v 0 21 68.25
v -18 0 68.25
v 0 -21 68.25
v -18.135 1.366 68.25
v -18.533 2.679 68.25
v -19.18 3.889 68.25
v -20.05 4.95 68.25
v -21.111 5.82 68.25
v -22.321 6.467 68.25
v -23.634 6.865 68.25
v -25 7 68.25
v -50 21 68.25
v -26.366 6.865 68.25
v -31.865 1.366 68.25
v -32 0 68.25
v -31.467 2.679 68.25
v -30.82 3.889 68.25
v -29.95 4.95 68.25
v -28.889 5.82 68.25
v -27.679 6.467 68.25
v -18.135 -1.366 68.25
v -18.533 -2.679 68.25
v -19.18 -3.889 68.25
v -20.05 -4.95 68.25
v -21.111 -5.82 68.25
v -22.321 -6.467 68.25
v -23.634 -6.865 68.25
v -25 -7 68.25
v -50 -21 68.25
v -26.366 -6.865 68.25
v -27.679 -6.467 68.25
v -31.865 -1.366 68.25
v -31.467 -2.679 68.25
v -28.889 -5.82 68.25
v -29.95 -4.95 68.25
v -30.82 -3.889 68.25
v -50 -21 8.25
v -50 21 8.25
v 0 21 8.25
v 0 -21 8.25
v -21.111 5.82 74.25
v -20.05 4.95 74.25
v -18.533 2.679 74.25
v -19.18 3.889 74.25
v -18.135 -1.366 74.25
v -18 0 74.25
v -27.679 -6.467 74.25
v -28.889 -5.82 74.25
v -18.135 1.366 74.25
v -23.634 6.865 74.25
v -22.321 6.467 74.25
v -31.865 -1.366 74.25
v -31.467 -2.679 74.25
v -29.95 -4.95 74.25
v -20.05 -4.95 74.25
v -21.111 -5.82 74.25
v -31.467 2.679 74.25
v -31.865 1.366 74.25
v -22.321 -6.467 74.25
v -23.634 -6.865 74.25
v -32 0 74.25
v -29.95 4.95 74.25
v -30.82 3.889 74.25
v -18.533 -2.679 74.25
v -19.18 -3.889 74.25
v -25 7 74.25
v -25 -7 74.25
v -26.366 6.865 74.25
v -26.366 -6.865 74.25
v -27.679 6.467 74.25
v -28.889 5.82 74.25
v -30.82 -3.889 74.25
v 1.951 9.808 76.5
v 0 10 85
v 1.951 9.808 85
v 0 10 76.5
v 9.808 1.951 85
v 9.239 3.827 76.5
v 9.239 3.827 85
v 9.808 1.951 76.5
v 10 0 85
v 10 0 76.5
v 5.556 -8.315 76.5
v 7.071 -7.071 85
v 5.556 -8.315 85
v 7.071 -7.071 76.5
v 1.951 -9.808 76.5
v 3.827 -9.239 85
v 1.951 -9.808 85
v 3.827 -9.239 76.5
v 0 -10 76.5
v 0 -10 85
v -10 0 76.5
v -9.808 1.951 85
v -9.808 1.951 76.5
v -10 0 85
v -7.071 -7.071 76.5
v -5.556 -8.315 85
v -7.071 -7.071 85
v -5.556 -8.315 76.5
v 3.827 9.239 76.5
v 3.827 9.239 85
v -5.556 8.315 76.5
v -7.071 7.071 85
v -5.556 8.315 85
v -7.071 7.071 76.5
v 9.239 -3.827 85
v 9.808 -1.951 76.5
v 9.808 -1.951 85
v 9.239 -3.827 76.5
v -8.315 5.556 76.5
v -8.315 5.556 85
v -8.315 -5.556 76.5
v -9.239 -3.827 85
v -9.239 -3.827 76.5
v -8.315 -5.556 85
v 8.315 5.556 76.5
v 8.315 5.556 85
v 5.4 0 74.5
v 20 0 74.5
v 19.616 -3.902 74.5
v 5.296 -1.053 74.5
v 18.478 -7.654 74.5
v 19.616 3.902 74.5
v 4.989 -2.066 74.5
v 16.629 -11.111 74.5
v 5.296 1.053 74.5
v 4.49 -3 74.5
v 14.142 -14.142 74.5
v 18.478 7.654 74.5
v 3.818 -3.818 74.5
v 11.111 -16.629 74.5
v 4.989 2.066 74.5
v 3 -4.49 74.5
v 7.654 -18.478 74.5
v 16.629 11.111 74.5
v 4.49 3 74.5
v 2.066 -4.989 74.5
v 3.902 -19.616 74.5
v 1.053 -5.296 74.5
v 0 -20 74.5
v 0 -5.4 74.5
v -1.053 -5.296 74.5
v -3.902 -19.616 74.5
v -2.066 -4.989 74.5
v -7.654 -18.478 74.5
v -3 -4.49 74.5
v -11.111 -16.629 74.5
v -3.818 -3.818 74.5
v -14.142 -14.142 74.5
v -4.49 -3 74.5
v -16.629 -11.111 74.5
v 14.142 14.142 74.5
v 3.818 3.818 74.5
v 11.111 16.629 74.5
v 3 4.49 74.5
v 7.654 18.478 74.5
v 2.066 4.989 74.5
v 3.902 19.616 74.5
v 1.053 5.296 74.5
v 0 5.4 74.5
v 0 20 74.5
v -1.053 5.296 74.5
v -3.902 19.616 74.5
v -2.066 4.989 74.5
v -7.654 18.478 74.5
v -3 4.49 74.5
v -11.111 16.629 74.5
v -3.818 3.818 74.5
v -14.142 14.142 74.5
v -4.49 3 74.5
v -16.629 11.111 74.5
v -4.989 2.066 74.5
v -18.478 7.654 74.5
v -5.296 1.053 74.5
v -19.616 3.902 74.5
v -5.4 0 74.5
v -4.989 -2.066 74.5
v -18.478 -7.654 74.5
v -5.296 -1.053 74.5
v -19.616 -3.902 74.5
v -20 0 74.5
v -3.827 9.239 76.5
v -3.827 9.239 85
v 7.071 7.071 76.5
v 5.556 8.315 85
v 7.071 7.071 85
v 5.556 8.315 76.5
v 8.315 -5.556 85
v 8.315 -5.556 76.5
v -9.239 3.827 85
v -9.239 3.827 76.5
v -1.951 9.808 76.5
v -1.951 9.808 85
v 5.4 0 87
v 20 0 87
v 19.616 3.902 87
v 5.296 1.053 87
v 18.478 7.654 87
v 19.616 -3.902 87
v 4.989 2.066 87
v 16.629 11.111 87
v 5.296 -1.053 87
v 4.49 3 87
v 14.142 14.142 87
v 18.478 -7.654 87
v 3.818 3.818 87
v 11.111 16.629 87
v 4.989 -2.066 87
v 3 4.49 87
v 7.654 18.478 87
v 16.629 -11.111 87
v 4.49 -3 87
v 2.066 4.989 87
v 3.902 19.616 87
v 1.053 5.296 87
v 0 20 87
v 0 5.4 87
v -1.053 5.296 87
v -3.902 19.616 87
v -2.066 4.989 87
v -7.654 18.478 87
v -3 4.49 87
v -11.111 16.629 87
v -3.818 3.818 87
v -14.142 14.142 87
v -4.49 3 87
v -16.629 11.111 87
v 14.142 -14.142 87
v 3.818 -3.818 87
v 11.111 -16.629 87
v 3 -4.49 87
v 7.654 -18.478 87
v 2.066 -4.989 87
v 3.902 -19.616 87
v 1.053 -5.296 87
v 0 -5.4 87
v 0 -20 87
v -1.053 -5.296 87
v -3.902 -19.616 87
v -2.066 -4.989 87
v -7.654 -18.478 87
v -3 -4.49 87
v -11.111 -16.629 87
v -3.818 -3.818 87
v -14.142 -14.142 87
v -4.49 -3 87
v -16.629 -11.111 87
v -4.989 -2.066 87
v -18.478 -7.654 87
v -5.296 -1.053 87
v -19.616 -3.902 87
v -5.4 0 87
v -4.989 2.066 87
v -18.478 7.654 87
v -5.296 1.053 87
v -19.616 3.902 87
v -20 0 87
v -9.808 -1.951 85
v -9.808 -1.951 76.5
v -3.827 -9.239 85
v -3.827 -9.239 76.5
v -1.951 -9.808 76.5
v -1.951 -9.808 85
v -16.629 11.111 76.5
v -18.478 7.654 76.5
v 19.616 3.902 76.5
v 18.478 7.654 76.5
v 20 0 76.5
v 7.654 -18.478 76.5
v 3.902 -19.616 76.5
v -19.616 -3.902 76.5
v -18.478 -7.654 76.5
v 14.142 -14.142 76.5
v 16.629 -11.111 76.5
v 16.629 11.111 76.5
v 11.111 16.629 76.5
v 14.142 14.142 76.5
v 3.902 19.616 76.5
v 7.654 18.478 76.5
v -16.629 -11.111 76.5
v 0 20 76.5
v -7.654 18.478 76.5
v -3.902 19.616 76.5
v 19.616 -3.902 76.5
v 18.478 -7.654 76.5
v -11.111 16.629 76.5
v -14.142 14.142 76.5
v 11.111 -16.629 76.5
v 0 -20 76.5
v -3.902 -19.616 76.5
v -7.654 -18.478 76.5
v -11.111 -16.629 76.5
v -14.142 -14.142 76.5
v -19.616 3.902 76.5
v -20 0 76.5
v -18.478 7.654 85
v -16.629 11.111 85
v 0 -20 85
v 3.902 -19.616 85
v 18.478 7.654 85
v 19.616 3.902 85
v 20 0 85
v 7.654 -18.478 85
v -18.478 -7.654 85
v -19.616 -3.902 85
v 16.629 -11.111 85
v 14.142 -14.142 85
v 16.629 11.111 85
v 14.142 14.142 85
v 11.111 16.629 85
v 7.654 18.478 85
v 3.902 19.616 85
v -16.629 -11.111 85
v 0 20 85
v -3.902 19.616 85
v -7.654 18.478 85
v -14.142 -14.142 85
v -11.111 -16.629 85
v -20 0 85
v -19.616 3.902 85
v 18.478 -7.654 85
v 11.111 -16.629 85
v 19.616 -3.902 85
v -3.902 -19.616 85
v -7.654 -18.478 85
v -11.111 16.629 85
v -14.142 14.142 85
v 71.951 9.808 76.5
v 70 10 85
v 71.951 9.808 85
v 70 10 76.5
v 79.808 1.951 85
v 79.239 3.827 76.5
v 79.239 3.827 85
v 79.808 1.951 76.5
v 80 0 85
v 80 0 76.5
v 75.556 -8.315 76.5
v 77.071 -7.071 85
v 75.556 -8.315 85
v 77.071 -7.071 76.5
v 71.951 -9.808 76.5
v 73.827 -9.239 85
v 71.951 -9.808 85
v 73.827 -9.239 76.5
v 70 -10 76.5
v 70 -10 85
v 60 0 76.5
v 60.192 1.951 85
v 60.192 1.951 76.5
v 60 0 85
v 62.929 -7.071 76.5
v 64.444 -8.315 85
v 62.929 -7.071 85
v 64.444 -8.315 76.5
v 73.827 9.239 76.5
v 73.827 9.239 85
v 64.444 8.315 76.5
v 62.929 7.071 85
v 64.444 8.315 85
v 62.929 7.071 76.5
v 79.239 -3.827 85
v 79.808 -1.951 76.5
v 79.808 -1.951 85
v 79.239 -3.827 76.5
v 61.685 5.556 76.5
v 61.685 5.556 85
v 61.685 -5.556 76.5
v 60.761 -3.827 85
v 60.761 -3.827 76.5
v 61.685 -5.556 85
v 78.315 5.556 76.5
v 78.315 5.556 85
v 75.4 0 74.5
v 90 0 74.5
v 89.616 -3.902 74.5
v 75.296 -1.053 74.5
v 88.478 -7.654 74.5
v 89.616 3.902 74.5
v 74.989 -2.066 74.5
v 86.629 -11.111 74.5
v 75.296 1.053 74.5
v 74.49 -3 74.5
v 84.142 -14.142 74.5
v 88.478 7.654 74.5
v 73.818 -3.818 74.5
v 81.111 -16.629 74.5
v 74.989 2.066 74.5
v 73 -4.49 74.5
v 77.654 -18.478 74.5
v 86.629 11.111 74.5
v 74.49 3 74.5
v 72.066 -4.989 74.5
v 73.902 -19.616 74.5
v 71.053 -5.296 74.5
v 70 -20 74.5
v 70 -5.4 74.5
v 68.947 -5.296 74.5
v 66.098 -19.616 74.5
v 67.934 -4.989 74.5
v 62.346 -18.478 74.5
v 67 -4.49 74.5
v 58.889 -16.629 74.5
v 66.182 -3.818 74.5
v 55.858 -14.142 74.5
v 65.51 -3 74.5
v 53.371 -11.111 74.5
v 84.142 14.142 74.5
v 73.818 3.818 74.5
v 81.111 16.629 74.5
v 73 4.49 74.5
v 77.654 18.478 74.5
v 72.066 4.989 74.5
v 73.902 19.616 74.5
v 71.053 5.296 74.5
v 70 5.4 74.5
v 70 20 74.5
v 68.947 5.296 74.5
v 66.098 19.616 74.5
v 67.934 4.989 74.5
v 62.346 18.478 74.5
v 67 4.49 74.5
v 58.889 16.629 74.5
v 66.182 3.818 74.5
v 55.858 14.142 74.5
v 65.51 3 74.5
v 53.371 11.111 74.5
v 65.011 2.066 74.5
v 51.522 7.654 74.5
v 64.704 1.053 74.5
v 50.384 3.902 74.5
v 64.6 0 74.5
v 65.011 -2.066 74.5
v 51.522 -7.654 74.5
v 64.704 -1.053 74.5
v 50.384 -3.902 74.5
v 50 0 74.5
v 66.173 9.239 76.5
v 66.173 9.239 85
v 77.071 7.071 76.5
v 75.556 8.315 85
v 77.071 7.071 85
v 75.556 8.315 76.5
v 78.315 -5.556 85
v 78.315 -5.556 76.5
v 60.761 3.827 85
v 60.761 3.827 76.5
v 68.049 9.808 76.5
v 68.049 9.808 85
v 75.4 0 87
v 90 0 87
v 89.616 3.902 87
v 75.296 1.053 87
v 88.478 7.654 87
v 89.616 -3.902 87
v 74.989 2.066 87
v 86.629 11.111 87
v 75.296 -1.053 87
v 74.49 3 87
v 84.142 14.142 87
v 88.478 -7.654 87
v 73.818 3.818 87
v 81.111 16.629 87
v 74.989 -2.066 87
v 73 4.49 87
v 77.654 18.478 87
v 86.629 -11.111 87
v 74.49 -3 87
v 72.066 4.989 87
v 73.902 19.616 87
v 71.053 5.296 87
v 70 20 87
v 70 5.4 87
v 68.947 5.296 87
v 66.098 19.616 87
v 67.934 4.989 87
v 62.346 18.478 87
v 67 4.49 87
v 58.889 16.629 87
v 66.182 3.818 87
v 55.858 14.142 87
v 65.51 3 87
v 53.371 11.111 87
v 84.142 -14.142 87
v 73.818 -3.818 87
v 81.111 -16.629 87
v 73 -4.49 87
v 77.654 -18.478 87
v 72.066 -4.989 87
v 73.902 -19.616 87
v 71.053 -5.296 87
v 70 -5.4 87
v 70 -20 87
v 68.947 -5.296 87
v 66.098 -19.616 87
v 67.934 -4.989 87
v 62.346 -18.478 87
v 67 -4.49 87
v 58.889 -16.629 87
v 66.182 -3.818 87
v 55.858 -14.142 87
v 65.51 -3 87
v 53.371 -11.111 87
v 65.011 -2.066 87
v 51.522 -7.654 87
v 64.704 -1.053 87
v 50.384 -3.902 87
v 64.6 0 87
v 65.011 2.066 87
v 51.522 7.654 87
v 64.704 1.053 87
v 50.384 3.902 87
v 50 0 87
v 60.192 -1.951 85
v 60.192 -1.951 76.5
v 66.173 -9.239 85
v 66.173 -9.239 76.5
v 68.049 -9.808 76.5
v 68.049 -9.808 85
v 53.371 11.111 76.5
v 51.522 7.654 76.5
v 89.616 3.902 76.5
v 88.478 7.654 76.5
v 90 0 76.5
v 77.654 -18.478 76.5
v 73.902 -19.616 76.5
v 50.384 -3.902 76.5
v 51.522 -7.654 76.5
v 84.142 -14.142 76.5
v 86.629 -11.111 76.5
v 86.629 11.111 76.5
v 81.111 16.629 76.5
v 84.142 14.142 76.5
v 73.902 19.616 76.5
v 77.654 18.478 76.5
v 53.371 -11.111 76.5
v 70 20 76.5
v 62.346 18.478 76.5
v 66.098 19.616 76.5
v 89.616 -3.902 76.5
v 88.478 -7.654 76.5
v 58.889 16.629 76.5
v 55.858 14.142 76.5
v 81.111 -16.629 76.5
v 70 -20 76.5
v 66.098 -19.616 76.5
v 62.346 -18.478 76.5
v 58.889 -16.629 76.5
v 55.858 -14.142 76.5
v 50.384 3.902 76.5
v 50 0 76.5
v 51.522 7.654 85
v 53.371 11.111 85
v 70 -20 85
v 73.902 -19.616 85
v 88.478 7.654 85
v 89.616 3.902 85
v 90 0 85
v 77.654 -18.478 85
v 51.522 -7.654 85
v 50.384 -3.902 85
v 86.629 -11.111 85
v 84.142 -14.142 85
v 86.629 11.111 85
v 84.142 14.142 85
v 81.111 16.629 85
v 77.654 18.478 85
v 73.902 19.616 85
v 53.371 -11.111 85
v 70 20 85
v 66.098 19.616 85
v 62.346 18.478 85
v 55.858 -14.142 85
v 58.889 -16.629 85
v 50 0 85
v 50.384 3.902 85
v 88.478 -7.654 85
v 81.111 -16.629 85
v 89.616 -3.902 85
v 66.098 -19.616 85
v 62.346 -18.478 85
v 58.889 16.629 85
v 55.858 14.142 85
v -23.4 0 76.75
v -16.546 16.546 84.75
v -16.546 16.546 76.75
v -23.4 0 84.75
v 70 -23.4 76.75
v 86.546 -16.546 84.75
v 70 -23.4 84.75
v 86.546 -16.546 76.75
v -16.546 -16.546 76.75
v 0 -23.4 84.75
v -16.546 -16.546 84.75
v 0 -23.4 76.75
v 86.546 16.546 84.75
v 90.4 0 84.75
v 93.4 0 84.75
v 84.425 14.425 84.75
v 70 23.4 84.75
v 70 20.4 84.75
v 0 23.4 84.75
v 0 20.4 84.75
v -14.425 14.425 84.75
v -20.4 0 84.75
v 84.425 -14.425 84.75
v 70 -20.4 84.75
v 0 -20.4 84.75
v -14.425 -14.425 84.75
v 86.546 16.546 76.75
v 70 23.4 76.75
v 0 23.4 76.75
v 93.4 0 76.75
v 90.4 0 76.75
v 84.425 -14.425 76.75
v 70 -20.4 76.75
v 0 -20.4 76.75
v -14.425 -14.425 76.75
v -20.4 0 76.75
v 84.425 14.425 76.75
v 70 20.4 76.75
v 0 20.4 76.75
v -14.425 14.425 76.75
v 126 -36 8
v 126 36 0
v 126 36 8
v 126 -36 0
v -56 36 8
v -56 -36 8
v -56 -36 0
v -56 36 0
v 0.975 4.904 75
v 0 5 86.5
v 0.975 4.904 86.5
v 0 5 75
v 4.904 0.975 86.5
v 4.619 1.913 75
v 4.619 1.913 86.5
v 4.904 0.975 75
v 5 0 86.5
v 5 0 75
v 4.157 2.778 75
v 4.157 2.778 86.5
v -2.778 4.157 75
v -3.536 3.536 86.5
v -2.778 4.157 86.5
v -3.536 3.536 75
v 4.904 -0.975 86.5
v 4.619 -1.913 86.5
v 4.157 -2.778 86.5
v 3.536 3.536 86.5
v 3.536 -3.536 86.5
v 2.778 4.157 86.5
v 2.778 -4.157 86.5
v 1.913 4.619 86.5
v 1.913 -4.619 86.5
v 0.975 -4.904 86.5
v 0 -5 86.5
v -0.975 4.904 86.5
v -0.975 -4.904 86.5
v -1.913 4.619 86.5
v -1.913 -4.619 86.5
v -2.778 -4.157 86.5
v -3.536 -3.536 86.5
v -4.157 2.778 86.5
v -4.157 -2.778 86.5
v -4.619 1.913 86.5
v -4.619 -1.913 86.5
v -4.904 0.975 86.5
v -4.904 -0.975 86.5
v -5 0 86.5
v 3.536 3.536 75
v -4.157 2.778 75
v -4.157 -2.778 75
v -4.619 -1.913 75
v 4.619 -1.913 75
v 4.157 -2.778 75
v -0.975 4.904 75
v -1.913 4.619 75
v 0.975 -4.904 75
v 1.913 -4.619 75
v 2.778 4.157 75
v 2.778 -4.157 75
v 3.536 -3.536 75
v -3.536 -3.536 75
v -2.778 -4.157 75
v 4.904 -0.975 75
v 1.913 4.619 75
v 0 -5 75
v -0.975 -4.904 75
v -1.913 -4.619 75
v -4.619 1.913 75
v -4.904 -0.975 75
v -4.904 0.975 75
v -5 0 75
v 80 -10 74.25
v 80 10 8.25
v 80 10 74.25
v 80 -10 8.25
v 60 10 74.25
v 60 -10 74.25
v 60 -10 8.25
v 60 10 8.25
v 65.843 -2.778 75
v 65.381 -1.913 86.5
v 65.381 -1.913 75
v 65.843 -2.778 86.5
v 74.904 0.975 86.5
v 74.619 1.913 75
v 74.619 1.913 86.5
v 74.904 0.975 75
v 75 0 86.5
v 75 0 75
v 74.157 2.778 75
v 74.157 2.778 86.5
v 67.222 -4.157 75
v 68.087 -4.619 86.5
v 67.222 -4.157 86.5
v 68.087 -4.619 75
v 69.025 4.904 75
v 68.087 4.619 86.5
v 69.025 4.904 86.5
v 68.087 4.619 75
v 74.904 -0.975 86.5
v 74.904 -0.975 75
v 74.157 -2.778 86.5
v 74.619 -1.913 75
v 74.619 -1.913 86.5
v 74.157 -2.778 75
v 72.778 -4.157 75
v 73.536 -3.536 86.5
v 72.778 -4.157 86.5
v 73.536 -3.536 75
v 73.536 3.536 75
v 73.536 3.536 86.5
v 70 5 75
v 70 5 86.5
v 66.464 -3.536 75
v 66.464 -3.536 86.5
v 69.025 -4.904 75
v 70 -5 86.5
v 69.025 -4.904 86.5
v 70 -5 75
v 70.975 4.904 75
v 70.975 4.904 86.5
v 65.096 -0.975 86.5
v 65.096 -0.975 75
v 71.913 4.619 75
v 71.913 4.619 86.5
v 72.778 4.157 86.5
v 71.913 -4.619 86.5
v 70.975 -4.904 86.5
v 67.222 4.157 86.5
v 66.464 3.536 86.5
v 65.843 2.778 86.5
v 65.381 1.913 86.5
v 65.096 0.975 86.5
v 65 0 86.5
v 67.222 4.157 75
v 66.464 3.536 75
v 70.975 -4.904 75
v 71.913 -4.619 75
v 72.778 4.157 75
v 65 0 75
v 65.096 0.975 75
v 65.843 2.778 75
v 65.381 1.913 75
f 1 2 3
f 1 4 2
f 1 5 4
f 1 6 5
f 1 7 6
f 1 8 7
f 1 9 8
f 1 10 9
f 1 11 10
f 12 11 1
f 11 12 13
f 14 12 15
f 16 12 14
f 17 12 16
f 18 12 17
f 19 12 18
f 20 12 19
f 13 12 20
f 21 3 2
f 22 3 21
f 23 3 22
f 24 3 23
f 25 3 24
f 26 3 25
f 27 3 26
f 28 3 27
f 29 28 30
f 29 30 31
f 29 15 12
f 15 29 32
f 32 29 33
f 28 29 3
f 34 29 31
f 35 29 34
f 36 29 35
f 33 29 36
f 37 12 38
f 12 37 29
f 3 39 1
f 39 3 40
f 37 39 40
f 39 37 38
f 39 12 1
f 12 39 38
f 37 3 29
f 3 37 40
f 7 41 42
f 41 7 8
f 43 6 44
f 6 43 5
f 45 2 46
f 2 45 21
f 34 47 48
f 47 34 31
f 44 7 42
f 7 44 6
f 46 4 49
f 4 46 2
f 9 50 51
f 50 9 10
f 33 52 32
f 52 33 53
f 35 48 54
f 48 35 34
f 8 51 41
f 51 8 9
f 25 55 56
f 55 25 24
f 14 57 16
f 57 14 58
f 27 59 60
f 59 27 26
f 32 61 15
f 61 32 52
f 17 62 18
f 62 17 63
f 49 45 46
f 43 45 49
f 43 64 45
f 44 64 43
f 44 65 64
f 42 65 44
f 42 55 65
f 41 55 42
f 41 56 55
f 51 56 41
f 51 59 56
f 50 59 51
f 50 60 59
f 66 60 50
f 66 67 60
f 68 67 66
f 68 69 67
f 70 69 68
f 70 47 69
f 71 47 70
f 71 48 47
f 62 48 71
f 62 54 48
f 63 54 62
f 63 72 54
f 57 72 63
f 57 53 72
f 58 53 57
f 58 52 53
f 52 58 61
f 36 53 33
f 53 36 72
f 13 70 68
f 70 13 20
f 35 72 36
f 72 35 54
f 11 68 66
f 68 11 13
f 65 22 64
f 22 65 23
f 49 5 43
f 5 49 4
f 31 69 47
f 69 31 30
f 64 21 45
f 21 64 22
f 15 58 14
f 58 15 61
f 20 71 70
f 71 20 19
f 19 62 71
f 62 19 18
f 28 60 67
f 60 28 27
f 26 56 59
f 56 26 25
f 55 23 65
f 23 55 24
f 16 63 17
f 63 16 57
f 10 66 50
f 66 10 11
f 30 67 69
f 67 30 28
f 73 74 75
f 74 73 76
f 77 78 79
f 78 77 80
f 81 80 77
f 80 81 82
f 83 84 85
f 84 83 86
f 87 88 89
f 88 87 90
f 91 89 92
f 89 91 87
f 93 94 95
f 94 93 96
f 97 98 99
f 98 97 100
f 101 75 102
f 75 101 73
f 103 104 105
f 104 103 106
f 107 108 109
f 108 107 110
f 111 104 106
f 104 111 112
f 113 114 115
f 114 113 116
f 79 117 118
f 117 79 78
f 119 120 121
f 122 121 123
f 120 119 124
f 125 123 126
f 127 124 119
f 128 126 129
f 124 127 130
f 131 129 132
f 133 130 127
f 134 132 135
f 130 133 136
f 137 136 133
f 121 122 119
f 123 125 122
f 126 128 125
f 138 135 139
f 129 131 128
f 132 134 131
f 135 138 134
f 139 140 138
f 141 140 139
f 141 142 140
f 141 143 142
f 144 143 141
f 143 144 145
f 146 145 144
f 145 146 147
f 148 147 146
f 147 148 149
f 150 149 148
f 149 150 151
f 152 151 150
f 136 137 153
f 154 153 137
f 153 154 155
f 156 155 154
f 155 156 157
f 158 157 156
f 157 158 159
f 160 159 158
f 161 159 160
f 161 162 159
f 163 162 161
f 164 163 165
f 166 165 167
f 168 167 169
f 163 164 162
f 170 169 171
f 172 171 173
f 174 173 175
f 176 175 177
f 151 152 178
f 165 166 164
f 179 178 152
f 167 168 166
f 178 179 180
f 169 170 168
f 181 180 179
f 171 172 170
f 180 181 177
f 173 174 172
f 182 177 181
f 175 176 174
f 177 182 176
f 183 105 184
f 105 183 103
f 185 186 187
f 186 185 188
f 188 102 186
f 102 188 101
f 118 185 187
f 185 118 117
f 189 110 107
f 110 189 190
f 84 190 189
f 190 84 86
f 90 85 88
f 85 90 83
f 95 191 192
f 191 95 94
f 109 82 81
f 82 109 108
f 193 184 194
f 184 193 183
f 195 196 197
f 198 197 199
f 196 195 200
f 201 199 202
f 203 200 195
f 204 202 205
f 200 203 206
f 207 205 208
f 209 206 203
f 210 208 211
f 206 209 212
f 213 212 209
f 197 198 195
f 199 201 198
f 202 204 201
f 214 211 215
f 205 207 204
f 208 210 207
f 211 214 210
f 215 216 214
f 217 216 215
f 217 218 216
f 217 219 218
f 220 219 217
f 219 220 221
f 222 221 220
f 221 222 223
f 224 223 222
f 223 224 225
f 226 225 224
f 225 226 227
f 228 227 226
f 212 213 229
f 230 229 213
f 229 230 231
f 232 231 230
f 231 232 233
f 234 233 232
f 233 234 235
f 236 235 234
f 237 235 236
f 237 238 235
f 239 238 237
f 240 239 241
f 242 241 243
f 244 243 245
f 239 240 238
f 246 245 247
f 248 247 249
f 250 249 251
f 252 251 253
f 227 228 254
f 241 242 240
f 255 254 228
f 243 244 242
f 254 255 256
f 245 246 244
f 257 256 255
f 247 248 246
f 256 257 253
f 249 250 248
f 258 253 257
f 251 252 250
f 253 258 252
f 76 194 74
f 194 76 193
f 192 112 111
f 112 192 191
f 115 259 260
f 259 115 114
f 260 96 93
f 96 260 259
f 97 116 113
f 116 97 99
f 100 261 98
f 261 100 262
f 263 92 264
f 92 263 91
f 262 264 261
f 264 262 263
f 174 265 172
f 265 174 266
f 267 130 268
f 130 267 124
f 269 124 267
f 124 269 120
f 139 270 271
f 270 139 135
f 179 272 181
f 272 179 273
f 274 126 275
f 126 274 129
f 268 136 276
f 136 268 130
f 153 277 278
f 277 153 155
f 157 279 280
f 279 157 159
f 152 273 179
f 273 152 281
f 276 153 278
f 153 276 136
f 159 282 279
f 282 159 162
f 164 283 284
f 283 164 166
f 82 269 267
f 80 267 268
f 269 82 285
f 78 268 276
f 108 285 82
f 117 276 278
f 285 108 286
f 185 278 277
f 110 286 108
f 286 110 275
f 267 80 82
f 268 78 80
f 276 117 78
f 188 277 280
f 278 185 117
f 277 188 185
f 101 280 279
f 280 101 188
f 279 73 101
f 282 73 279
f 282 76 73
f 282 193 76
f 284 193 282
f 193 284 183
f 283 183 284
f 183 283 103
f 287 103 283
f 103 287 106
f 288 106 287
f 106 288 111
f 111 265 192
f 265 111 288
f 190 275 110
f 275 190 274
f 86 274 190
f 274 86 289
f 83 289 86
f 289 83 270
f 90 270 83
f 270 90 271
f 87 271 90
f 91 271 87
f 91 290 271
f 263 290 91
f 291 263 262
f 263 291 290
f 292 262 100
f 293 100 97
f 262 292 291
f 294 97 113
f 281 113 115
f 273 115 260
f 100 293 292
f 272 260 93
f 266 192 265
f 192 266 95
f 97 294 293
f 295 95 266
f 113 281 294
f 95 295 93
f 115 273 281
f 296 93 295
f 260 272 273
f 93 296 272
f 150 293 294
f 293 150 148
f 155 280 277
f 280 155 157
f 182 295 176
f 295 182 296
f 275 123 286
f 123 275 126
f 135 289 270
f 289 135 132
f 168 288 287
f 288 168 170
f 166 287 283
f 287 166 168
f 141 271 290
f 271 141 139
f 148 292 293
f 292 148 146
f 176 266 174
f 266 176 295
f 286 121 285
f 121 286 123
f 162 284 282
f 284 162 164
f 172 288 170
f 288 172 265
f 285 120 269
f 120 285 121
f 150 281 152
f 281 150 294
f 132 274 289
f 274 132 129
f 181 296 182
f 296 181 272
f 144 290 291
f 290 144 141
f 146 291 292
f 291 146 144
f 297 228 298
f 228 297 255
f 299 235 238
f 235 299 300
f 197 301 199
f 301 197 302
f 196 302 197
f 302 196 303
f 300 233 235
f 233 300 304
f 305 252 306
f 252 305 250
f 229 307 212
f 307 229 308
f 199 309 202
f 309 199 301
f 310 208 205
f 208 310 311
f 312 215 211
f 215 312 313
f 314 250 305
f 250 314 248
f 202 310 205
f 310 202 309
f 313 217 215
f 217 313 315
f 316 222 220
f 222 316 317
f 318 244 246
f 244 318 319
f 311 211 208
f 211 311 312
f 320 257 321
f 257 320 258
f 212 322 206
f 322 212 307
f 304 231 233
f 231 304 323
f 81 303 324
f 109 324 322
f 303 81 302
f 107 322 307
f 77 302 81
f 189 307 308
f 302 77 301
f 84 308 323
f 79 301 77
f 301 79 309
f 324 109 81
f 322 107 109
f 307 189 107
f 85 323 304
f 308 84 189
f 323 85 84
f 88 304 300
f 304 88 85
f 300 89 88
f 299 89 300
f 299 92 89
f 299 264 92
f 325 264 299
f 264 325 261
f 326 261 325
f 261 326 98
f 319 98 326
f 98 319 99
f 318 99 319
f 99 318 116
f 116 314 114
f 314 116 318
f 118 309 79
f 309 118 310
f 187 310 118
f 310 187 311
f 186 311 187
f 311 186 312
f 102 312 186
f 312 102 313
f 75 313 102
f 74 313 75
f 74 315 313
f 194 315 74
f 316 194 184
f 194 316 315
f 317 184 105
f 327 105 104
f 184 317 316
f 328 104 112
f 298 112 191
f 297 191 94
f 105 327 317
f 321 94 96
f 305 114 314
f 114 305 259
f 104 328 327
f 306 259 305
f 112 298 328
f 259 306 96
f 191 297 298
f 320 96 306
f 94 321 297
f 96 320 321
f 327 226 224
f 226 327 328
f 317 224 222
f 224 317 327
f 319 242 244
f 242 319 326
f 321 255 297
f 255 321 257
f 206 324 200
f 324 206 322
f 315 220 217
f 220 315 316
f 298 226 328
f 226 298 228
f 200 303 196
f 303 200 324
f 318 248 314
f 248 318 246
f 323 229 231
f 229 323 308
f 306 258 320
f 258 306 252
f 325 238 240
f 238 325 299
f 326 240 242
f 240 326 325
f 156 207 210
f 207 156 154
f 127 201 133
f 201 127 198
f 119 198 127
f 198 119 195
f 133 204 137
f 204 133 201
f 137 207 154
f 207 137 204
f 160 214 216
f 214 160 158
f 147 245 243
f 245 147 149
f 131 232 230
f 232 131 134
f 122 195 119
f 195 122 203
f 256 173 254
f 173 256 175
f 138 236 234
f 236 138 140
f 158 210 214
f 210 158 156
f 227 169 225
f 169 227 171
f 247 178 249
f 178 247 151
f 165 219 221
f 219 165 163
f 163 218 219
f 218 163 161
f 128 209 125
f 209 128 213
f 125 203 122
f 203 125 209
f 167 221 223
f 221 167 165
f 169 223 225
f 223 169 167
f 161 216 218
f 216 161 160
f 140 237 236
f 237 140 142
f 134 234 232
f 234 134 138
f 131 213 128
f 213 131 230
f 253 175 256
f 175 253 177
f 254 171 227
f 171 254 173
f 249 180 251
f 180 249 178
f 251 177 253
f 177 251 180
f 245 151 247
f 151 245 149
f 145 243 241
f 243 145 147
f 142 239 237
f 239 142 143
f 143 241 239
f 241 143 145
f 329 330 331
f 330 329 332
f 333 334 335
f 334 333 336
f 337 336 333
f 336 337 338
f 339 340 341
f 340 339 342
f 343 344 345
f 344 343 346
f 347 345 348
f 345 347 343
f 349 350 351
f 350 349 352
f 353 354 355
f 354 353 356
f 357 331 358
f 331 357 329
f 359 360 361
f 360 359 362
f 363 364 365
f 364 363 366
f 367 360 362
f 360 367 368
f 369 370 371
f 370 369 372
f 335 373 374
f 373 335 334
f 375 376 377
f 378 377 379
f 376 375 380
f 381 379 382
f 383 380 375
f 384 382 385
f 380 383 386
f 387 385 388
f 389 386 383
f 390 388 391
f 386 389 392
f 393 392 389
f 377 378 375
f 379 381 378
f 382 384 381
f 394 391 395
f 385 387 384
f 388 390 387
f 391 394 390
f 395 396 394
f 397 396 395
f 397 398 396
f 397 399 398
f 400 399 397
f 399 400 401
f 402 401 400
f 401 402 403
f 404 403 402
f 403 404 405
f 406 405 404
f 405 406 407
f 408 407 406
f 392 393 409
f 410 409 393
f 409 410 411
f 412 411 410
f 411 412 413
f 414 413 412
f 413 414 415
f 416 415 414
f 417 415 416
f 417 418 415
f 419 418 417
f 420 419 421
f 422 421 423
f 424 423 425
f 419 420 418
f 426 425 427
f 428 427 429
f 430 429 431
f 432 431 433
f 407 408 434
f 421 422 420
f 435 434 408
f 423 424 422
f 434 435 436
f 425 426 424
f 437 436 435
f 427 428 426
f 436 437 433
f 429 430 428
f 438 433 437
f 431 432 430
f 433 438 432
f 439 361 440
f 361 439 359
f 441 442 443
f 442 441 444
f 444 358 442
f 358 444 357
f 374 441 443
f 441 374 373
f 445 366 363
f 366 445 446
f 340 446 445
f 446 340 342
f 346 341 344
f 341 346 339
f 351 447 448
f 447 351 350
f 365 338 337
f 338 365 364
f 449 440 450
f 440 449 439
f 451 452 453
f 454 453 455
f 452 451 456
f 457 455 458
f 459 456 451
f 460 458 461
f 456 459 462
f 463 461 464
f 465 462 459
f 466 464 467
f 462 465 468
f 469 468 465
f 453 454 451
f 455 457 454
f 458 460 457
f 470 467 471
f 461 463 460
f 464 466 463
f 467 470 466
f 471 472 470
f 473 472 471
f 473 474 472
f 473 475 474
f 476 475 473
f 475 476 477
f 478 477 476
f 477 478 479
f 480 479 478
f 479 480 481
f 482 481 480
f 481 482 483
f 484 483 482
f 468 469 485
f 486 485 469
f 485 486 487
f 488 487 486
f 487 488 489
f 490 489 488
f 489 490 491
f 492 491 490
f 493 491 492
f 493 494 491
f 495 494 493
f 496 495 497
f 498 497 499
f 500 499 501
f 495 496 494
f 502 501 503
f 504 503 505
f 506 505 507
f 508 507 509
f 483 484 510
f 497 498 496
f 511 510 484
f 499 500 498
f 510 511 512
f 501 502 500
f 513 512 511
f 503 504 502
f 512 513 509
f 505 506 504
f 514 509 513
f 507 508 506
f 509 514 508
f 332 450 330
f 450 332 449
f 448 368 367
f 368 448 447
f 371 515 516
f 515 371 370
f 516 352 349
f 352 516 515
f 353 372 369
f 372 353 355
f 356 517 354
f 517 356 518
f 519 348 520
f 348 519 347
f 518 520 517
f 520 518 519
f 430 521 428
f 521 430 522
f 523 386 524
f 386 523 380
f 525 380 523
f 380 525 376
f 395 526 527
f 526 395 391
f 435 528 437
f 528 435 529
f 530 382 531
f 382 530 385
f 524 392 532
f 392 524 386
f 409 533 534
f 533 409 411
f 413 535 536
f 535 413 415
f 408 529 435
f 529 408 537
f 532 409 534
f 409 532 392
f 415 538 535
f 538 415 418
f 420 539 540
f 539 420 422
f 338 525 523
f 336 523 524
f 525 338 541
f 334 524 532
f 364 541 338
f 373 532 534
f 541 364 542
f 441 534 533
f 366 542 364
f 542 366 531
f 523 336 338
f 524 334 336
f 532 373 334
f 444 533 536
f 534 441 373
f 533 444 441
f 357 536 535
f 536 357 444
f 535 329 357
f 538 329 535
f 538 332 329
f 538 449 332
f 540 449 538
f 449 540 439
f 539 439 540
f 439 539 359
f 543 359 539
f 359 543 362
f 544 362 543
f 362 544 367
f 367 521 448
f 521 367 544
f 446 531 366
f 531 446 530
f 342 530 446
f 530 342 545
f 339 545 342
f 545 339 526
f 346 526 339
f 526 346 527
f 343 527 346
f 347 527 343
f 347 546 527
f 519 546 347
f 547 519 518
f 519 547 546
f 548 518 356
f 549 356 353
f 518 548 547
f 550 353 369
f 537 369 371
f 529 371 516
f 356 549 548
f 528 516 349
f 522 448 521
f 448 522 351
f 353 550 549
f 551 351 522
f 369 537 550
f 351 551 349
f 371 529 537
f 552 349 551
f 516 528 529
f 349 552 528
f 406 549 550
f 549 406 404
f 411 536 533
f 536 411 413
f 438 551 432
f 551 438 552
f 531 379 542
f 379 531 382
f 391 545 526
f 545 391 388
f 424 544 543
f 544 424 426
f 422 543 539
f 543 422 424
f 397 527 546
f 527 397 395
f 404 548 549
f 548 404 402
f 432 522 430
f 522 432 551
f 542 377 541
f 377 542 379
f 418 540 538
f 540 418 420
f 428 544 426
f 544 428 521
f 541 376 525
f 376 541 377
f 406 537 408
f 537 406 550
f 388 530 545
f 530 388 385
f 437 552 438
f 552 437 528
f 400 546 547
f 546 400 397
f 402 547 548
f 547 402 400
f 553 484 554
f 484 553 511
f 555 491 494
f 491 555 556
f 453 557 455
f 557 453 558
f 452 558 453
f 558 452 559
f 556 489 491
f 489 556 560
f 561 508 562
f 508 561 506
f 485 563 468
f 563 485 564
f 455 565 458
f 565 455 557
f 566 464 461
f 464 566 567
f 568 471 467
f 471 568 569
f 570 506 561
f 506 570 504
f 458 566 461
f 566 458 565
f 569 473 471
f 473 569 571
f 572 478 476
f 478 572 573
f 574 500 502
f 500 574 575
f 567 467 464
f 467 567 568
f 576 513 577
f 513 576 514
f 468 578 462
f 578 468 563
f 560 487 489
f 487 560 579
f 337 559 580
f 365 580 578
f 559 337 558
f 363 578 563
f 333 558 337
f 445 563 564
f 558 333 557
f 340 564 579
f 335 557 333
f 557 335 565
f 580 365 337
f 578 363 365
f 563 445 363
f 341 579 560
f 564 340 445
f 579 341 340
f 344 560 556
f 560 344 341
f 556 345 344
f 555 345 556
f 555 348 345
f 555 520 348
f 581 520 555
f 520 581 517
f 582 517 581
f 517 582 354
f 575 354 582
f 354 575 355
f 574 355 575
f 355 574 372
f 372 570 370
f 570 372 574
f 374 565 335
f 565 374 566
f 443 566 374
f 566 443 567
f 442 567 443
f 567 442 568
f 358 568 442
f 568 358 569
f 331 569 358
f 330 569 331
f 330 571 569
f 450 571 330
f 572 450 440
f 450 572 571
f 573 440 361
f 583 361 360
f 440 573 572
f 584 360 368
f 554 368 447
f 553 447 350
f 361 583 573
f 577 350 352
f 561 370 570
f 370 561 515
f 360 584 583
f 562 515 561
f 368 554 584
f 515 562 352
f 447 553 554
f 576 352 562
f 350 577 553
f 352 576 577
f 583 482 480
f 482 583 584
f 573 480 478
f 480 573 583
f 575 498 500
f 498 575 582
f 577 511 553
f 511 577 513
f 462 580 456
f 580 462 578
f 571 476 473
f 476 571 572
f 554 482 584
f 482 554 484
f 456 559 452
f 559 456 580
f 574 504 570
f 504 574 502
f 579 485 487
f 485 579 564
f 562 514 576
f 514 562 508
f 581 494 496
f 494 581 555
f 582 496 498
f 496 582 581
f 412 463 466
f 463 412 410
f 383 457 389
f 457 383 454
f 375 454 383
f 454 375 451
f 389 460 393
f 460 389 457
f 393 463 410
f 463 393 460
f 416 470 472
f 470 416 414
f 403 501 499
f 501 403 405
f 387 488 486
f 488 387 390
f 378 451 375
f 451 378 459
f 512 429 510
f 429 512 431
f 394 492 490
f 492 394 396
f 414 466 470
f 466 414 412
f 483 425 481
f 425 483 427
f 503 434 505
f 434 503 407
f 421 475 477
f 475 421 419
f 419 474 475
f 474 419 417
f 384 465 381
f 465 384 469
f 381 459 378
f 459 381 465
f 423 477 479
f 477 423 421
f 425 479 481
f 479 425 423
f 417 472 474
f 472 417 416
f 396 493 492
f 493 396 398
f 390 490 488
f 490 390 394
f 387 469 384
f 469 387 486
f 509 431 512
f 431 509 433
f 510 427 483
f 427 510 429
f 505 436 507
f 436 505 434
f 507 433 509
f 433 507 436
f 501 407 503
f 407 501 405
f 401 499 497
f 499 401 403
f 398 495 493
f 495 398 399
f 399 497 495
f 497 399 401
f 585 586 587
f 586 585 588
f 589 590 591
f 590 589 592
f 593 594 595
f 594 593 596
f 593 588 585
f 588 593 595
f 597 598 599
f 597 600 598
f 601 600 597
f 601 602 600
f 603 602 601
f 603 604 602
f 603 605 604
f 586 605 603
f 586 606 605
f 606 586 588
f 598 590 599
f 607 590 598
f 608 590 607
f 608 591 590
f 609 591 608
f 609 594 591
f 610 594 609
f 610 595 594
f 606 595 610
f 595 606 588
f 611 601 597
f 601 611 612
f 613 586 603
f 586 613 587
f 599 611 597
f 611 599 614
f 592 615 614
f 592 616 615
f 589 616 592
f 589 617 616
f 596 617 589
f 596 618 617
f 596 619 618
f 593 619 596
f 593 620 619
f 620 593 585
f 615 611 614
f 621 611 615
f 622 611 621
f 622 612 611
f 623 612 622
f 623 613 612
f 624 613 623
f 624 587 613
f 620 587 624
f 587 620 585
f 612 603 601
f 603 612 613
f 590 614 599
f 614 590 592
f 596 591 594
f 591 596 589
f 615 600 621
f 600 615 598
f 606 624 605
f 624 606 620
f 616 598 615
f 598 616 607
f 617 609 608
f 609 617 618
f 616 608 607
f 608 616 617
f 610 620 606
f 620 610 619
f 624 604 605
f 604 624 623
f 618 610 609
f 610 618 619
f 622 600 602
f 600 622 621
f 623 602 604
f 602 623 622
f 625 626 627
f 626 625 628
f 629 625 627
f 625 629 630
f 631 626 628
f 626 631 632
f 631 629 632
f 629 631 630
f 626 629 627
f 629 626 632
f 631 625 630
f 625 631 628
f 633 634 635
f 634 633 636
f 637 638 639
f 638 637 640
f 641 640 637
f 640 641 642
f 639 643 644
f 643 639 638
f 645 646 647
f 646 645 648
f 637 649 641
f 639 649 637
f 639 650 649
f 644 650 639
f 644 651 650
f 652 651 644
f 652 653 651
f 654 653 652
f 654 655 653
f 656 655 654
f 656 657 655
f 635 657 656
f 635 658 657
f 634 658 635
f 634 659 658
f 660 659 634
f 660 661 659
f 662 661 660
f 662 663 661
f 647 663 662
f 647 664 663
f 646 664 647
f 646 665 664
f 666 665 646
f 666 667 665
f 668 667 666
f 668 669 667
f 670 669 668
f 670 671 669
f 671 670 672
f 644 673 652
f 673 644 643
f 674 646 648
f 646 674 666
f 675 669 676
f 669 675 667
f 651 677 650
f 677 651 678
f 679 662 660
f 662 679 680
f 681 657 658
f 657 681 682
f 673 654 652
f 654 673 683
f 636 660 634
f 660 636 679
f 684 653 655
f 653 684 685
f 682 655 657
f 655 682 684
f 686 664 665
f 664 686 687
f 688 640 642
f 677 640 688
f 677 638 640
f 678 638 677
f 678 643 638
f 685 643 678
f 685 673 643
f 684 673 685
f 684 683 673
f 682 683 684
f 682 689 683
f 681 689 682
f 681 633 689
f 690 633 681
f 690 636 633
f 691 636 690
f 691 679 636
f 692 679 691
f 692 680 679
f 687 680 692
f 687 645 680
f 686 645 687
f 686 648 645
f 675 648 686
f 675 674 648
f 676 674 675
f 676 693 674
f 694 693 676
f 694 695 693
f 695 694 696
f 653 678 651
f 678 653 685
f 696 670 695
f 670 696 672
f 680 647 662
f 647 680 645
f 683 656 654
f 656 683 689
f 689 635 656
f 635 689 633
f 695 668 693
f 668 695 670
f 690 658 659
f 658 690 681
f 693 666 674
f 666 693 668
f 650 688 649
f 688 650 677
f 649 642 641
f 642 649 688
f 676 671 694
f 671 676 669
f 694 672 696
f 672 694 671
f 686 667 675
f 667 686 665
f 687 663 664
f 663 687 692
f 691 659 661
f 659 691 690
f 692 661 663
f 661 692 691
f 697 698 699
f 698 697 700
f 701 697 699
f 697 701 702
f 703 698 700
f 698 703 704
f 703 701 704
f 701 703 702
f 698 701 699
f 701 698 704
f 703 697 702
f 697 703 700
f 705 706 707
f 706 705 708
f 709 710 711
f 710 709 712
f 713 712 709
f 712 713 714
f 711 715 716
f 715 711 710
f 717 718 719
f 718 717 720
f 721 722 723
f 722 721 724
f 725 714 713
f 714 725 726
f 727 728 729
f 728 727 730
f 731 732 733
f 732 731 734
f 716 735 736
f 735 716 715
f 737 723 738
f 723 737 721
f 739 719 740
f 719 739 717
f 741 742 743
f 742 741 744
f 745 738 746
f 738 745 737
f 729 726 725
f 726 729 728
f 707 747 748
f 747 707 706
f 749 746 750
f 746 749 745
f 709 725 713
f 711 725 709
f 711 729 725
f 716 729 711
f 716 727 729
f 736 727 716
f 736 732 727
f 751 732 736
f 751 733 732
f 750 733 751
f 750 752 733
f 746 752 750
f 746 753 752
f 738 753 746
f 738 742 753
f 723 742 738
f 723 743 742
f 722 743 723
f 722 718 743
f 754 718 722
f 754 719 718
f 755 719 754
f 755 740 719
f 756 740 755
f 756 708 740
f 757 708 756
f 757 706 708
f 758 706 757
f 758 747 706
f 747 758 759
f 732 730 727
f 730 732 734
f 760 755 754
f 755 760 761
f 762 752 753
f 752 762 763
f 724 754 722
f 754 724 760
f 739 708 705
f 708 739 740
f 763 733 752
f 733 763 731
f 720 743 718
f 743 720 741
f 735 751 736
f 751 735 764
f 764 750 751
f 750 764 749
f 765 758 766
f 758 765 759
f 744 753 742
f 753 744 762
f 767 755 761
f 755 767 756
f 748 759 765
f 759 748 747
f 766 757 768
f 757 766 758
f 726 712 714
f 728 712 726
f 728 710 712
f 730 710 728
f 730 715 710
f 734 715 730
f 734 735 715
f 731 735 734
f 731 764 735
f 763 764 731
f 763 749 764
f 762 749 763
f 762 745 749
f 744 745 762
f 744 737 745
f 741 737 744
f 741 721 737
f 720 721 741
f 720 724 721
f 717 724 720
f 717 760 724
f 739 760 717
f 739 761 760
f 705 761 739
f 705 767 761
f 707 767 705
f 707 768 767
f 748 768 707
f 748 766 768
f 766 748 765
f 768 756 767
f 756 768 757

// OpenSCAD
$fn = 32;

// ------------------------------------------------------------------------
// Motor belt drive: span 70 mm, pulleys d40, belt 8 mm wide
// Every part is its own module, assembly() places every instance.
// ------------------------------------------------------------------------

// --- part 1 ---
module base_plate() {
  difference() {
    translate([-91, -36, 0]) cube([182, 72, 8]);
  }
}

// --- part 2 ---
module motor() {
  union() {
    translate([-30, -21, 0]) cube([60, 42, 50]);
    translate([33, 0, 25]) rotate([0, 90, 0]) cylinder(h = 6, d = 14, center = true);
  }
}

// --- part 3 ---
module drive_shaft() {
  translate([0, 0, -5.75]) cylinder(h = 11.5, d = 10);
}

// --- part 4 ---
module pulley_drive() {
  difference() {
    union() {
      cylinder(h = 12.5, d = 20);
      cylinder(h = 2, d = 40);
      translate([0, 0, 10.5]) cylinder(h = 2, d = 40);
    }
    translate([0, 0, -1]) cylinder(h = 14.5, d = 10.8);
  }
}

// --- part 5 ---
module idler_post() {
  translate([-10, -10, 0]) cube([20, 20, 66]);
}

// --- part 6 ---
module driven_shaft() {
  translate([0, 0, -5.75]) cylinder(h = 11.5, d = 10);
}

// --- part 7 ---
module pulley_driven() {
  difference() {
    union() {
      cylinder(h = 12.5, d = 20);
      cylinder(h = 2, d = 40);
      translate([0, 0, 10.5]) cylinder(h = 2, d = 40);
    }
    translate([0, 0, -1]) cylinder(h = 14.5, d = 10.8);
  }
}

// --- part 8 ---
module drive_belt() {
  difference() {
    linear_extrude(height = 8) polygon(points = concat([for (a = [90 : 45 : 270]) [23.4 * cos(a), 23.4 * sin(a)]], [for (a = [270 : 45 : 450]) [70 + 23.4 * cos(a), 23.4 * sin(a)]]));
    translate([0, 0, -1]) linear_extrude(height = 10) polygon(points = concat([for (a = [90 : 45 : 270]) [20.4 * cos(a), 20.4 * sin(a)]], [for (a = [270 : 45 : 450]) [70 + 20.4 * cos(a), 20.4 * sin(a)]]));
  }
}

// --- assembly ---
module assembly() {
  color([0.80, 0.24, 0.20]) translate([35, 0, 0]) rotate([0, 0, 0]) base_plate();
  color([0.20, 0.45, 0.75]) translate([0, 0, 38.25]) rotate([0, 270, 0]) motor();
  color([0.25, 0.62, 0.32]) translate([0, 0, 80.75]) rotate([0, 0, 0]) drive_shaft();
  color([0.92, 0.70, 0.18]) translate([0, 0, 74.5]) rotate([0, 0, 0]) pulley_drive();
  color([0.58, 0.35, 0.70]) translate([70, 0, 8.25]) rotate([0, 0, 0]) idler_post();
  color([0.16, 0.66, 0.66]) translate([70, 0, 80.75]) rotate([0, 0, 0]) driven_shaft();
  color([0.85, 0.48, 0.18]) translate([70, 0, 74.5]) rotate([0, 0, 0]) pulley_driven();
  color([0.55, 0.60, 0.65]) translate([0, 0, 76.75]) rotate([0, 0, 0]) drive_belt();
}

assembly();
